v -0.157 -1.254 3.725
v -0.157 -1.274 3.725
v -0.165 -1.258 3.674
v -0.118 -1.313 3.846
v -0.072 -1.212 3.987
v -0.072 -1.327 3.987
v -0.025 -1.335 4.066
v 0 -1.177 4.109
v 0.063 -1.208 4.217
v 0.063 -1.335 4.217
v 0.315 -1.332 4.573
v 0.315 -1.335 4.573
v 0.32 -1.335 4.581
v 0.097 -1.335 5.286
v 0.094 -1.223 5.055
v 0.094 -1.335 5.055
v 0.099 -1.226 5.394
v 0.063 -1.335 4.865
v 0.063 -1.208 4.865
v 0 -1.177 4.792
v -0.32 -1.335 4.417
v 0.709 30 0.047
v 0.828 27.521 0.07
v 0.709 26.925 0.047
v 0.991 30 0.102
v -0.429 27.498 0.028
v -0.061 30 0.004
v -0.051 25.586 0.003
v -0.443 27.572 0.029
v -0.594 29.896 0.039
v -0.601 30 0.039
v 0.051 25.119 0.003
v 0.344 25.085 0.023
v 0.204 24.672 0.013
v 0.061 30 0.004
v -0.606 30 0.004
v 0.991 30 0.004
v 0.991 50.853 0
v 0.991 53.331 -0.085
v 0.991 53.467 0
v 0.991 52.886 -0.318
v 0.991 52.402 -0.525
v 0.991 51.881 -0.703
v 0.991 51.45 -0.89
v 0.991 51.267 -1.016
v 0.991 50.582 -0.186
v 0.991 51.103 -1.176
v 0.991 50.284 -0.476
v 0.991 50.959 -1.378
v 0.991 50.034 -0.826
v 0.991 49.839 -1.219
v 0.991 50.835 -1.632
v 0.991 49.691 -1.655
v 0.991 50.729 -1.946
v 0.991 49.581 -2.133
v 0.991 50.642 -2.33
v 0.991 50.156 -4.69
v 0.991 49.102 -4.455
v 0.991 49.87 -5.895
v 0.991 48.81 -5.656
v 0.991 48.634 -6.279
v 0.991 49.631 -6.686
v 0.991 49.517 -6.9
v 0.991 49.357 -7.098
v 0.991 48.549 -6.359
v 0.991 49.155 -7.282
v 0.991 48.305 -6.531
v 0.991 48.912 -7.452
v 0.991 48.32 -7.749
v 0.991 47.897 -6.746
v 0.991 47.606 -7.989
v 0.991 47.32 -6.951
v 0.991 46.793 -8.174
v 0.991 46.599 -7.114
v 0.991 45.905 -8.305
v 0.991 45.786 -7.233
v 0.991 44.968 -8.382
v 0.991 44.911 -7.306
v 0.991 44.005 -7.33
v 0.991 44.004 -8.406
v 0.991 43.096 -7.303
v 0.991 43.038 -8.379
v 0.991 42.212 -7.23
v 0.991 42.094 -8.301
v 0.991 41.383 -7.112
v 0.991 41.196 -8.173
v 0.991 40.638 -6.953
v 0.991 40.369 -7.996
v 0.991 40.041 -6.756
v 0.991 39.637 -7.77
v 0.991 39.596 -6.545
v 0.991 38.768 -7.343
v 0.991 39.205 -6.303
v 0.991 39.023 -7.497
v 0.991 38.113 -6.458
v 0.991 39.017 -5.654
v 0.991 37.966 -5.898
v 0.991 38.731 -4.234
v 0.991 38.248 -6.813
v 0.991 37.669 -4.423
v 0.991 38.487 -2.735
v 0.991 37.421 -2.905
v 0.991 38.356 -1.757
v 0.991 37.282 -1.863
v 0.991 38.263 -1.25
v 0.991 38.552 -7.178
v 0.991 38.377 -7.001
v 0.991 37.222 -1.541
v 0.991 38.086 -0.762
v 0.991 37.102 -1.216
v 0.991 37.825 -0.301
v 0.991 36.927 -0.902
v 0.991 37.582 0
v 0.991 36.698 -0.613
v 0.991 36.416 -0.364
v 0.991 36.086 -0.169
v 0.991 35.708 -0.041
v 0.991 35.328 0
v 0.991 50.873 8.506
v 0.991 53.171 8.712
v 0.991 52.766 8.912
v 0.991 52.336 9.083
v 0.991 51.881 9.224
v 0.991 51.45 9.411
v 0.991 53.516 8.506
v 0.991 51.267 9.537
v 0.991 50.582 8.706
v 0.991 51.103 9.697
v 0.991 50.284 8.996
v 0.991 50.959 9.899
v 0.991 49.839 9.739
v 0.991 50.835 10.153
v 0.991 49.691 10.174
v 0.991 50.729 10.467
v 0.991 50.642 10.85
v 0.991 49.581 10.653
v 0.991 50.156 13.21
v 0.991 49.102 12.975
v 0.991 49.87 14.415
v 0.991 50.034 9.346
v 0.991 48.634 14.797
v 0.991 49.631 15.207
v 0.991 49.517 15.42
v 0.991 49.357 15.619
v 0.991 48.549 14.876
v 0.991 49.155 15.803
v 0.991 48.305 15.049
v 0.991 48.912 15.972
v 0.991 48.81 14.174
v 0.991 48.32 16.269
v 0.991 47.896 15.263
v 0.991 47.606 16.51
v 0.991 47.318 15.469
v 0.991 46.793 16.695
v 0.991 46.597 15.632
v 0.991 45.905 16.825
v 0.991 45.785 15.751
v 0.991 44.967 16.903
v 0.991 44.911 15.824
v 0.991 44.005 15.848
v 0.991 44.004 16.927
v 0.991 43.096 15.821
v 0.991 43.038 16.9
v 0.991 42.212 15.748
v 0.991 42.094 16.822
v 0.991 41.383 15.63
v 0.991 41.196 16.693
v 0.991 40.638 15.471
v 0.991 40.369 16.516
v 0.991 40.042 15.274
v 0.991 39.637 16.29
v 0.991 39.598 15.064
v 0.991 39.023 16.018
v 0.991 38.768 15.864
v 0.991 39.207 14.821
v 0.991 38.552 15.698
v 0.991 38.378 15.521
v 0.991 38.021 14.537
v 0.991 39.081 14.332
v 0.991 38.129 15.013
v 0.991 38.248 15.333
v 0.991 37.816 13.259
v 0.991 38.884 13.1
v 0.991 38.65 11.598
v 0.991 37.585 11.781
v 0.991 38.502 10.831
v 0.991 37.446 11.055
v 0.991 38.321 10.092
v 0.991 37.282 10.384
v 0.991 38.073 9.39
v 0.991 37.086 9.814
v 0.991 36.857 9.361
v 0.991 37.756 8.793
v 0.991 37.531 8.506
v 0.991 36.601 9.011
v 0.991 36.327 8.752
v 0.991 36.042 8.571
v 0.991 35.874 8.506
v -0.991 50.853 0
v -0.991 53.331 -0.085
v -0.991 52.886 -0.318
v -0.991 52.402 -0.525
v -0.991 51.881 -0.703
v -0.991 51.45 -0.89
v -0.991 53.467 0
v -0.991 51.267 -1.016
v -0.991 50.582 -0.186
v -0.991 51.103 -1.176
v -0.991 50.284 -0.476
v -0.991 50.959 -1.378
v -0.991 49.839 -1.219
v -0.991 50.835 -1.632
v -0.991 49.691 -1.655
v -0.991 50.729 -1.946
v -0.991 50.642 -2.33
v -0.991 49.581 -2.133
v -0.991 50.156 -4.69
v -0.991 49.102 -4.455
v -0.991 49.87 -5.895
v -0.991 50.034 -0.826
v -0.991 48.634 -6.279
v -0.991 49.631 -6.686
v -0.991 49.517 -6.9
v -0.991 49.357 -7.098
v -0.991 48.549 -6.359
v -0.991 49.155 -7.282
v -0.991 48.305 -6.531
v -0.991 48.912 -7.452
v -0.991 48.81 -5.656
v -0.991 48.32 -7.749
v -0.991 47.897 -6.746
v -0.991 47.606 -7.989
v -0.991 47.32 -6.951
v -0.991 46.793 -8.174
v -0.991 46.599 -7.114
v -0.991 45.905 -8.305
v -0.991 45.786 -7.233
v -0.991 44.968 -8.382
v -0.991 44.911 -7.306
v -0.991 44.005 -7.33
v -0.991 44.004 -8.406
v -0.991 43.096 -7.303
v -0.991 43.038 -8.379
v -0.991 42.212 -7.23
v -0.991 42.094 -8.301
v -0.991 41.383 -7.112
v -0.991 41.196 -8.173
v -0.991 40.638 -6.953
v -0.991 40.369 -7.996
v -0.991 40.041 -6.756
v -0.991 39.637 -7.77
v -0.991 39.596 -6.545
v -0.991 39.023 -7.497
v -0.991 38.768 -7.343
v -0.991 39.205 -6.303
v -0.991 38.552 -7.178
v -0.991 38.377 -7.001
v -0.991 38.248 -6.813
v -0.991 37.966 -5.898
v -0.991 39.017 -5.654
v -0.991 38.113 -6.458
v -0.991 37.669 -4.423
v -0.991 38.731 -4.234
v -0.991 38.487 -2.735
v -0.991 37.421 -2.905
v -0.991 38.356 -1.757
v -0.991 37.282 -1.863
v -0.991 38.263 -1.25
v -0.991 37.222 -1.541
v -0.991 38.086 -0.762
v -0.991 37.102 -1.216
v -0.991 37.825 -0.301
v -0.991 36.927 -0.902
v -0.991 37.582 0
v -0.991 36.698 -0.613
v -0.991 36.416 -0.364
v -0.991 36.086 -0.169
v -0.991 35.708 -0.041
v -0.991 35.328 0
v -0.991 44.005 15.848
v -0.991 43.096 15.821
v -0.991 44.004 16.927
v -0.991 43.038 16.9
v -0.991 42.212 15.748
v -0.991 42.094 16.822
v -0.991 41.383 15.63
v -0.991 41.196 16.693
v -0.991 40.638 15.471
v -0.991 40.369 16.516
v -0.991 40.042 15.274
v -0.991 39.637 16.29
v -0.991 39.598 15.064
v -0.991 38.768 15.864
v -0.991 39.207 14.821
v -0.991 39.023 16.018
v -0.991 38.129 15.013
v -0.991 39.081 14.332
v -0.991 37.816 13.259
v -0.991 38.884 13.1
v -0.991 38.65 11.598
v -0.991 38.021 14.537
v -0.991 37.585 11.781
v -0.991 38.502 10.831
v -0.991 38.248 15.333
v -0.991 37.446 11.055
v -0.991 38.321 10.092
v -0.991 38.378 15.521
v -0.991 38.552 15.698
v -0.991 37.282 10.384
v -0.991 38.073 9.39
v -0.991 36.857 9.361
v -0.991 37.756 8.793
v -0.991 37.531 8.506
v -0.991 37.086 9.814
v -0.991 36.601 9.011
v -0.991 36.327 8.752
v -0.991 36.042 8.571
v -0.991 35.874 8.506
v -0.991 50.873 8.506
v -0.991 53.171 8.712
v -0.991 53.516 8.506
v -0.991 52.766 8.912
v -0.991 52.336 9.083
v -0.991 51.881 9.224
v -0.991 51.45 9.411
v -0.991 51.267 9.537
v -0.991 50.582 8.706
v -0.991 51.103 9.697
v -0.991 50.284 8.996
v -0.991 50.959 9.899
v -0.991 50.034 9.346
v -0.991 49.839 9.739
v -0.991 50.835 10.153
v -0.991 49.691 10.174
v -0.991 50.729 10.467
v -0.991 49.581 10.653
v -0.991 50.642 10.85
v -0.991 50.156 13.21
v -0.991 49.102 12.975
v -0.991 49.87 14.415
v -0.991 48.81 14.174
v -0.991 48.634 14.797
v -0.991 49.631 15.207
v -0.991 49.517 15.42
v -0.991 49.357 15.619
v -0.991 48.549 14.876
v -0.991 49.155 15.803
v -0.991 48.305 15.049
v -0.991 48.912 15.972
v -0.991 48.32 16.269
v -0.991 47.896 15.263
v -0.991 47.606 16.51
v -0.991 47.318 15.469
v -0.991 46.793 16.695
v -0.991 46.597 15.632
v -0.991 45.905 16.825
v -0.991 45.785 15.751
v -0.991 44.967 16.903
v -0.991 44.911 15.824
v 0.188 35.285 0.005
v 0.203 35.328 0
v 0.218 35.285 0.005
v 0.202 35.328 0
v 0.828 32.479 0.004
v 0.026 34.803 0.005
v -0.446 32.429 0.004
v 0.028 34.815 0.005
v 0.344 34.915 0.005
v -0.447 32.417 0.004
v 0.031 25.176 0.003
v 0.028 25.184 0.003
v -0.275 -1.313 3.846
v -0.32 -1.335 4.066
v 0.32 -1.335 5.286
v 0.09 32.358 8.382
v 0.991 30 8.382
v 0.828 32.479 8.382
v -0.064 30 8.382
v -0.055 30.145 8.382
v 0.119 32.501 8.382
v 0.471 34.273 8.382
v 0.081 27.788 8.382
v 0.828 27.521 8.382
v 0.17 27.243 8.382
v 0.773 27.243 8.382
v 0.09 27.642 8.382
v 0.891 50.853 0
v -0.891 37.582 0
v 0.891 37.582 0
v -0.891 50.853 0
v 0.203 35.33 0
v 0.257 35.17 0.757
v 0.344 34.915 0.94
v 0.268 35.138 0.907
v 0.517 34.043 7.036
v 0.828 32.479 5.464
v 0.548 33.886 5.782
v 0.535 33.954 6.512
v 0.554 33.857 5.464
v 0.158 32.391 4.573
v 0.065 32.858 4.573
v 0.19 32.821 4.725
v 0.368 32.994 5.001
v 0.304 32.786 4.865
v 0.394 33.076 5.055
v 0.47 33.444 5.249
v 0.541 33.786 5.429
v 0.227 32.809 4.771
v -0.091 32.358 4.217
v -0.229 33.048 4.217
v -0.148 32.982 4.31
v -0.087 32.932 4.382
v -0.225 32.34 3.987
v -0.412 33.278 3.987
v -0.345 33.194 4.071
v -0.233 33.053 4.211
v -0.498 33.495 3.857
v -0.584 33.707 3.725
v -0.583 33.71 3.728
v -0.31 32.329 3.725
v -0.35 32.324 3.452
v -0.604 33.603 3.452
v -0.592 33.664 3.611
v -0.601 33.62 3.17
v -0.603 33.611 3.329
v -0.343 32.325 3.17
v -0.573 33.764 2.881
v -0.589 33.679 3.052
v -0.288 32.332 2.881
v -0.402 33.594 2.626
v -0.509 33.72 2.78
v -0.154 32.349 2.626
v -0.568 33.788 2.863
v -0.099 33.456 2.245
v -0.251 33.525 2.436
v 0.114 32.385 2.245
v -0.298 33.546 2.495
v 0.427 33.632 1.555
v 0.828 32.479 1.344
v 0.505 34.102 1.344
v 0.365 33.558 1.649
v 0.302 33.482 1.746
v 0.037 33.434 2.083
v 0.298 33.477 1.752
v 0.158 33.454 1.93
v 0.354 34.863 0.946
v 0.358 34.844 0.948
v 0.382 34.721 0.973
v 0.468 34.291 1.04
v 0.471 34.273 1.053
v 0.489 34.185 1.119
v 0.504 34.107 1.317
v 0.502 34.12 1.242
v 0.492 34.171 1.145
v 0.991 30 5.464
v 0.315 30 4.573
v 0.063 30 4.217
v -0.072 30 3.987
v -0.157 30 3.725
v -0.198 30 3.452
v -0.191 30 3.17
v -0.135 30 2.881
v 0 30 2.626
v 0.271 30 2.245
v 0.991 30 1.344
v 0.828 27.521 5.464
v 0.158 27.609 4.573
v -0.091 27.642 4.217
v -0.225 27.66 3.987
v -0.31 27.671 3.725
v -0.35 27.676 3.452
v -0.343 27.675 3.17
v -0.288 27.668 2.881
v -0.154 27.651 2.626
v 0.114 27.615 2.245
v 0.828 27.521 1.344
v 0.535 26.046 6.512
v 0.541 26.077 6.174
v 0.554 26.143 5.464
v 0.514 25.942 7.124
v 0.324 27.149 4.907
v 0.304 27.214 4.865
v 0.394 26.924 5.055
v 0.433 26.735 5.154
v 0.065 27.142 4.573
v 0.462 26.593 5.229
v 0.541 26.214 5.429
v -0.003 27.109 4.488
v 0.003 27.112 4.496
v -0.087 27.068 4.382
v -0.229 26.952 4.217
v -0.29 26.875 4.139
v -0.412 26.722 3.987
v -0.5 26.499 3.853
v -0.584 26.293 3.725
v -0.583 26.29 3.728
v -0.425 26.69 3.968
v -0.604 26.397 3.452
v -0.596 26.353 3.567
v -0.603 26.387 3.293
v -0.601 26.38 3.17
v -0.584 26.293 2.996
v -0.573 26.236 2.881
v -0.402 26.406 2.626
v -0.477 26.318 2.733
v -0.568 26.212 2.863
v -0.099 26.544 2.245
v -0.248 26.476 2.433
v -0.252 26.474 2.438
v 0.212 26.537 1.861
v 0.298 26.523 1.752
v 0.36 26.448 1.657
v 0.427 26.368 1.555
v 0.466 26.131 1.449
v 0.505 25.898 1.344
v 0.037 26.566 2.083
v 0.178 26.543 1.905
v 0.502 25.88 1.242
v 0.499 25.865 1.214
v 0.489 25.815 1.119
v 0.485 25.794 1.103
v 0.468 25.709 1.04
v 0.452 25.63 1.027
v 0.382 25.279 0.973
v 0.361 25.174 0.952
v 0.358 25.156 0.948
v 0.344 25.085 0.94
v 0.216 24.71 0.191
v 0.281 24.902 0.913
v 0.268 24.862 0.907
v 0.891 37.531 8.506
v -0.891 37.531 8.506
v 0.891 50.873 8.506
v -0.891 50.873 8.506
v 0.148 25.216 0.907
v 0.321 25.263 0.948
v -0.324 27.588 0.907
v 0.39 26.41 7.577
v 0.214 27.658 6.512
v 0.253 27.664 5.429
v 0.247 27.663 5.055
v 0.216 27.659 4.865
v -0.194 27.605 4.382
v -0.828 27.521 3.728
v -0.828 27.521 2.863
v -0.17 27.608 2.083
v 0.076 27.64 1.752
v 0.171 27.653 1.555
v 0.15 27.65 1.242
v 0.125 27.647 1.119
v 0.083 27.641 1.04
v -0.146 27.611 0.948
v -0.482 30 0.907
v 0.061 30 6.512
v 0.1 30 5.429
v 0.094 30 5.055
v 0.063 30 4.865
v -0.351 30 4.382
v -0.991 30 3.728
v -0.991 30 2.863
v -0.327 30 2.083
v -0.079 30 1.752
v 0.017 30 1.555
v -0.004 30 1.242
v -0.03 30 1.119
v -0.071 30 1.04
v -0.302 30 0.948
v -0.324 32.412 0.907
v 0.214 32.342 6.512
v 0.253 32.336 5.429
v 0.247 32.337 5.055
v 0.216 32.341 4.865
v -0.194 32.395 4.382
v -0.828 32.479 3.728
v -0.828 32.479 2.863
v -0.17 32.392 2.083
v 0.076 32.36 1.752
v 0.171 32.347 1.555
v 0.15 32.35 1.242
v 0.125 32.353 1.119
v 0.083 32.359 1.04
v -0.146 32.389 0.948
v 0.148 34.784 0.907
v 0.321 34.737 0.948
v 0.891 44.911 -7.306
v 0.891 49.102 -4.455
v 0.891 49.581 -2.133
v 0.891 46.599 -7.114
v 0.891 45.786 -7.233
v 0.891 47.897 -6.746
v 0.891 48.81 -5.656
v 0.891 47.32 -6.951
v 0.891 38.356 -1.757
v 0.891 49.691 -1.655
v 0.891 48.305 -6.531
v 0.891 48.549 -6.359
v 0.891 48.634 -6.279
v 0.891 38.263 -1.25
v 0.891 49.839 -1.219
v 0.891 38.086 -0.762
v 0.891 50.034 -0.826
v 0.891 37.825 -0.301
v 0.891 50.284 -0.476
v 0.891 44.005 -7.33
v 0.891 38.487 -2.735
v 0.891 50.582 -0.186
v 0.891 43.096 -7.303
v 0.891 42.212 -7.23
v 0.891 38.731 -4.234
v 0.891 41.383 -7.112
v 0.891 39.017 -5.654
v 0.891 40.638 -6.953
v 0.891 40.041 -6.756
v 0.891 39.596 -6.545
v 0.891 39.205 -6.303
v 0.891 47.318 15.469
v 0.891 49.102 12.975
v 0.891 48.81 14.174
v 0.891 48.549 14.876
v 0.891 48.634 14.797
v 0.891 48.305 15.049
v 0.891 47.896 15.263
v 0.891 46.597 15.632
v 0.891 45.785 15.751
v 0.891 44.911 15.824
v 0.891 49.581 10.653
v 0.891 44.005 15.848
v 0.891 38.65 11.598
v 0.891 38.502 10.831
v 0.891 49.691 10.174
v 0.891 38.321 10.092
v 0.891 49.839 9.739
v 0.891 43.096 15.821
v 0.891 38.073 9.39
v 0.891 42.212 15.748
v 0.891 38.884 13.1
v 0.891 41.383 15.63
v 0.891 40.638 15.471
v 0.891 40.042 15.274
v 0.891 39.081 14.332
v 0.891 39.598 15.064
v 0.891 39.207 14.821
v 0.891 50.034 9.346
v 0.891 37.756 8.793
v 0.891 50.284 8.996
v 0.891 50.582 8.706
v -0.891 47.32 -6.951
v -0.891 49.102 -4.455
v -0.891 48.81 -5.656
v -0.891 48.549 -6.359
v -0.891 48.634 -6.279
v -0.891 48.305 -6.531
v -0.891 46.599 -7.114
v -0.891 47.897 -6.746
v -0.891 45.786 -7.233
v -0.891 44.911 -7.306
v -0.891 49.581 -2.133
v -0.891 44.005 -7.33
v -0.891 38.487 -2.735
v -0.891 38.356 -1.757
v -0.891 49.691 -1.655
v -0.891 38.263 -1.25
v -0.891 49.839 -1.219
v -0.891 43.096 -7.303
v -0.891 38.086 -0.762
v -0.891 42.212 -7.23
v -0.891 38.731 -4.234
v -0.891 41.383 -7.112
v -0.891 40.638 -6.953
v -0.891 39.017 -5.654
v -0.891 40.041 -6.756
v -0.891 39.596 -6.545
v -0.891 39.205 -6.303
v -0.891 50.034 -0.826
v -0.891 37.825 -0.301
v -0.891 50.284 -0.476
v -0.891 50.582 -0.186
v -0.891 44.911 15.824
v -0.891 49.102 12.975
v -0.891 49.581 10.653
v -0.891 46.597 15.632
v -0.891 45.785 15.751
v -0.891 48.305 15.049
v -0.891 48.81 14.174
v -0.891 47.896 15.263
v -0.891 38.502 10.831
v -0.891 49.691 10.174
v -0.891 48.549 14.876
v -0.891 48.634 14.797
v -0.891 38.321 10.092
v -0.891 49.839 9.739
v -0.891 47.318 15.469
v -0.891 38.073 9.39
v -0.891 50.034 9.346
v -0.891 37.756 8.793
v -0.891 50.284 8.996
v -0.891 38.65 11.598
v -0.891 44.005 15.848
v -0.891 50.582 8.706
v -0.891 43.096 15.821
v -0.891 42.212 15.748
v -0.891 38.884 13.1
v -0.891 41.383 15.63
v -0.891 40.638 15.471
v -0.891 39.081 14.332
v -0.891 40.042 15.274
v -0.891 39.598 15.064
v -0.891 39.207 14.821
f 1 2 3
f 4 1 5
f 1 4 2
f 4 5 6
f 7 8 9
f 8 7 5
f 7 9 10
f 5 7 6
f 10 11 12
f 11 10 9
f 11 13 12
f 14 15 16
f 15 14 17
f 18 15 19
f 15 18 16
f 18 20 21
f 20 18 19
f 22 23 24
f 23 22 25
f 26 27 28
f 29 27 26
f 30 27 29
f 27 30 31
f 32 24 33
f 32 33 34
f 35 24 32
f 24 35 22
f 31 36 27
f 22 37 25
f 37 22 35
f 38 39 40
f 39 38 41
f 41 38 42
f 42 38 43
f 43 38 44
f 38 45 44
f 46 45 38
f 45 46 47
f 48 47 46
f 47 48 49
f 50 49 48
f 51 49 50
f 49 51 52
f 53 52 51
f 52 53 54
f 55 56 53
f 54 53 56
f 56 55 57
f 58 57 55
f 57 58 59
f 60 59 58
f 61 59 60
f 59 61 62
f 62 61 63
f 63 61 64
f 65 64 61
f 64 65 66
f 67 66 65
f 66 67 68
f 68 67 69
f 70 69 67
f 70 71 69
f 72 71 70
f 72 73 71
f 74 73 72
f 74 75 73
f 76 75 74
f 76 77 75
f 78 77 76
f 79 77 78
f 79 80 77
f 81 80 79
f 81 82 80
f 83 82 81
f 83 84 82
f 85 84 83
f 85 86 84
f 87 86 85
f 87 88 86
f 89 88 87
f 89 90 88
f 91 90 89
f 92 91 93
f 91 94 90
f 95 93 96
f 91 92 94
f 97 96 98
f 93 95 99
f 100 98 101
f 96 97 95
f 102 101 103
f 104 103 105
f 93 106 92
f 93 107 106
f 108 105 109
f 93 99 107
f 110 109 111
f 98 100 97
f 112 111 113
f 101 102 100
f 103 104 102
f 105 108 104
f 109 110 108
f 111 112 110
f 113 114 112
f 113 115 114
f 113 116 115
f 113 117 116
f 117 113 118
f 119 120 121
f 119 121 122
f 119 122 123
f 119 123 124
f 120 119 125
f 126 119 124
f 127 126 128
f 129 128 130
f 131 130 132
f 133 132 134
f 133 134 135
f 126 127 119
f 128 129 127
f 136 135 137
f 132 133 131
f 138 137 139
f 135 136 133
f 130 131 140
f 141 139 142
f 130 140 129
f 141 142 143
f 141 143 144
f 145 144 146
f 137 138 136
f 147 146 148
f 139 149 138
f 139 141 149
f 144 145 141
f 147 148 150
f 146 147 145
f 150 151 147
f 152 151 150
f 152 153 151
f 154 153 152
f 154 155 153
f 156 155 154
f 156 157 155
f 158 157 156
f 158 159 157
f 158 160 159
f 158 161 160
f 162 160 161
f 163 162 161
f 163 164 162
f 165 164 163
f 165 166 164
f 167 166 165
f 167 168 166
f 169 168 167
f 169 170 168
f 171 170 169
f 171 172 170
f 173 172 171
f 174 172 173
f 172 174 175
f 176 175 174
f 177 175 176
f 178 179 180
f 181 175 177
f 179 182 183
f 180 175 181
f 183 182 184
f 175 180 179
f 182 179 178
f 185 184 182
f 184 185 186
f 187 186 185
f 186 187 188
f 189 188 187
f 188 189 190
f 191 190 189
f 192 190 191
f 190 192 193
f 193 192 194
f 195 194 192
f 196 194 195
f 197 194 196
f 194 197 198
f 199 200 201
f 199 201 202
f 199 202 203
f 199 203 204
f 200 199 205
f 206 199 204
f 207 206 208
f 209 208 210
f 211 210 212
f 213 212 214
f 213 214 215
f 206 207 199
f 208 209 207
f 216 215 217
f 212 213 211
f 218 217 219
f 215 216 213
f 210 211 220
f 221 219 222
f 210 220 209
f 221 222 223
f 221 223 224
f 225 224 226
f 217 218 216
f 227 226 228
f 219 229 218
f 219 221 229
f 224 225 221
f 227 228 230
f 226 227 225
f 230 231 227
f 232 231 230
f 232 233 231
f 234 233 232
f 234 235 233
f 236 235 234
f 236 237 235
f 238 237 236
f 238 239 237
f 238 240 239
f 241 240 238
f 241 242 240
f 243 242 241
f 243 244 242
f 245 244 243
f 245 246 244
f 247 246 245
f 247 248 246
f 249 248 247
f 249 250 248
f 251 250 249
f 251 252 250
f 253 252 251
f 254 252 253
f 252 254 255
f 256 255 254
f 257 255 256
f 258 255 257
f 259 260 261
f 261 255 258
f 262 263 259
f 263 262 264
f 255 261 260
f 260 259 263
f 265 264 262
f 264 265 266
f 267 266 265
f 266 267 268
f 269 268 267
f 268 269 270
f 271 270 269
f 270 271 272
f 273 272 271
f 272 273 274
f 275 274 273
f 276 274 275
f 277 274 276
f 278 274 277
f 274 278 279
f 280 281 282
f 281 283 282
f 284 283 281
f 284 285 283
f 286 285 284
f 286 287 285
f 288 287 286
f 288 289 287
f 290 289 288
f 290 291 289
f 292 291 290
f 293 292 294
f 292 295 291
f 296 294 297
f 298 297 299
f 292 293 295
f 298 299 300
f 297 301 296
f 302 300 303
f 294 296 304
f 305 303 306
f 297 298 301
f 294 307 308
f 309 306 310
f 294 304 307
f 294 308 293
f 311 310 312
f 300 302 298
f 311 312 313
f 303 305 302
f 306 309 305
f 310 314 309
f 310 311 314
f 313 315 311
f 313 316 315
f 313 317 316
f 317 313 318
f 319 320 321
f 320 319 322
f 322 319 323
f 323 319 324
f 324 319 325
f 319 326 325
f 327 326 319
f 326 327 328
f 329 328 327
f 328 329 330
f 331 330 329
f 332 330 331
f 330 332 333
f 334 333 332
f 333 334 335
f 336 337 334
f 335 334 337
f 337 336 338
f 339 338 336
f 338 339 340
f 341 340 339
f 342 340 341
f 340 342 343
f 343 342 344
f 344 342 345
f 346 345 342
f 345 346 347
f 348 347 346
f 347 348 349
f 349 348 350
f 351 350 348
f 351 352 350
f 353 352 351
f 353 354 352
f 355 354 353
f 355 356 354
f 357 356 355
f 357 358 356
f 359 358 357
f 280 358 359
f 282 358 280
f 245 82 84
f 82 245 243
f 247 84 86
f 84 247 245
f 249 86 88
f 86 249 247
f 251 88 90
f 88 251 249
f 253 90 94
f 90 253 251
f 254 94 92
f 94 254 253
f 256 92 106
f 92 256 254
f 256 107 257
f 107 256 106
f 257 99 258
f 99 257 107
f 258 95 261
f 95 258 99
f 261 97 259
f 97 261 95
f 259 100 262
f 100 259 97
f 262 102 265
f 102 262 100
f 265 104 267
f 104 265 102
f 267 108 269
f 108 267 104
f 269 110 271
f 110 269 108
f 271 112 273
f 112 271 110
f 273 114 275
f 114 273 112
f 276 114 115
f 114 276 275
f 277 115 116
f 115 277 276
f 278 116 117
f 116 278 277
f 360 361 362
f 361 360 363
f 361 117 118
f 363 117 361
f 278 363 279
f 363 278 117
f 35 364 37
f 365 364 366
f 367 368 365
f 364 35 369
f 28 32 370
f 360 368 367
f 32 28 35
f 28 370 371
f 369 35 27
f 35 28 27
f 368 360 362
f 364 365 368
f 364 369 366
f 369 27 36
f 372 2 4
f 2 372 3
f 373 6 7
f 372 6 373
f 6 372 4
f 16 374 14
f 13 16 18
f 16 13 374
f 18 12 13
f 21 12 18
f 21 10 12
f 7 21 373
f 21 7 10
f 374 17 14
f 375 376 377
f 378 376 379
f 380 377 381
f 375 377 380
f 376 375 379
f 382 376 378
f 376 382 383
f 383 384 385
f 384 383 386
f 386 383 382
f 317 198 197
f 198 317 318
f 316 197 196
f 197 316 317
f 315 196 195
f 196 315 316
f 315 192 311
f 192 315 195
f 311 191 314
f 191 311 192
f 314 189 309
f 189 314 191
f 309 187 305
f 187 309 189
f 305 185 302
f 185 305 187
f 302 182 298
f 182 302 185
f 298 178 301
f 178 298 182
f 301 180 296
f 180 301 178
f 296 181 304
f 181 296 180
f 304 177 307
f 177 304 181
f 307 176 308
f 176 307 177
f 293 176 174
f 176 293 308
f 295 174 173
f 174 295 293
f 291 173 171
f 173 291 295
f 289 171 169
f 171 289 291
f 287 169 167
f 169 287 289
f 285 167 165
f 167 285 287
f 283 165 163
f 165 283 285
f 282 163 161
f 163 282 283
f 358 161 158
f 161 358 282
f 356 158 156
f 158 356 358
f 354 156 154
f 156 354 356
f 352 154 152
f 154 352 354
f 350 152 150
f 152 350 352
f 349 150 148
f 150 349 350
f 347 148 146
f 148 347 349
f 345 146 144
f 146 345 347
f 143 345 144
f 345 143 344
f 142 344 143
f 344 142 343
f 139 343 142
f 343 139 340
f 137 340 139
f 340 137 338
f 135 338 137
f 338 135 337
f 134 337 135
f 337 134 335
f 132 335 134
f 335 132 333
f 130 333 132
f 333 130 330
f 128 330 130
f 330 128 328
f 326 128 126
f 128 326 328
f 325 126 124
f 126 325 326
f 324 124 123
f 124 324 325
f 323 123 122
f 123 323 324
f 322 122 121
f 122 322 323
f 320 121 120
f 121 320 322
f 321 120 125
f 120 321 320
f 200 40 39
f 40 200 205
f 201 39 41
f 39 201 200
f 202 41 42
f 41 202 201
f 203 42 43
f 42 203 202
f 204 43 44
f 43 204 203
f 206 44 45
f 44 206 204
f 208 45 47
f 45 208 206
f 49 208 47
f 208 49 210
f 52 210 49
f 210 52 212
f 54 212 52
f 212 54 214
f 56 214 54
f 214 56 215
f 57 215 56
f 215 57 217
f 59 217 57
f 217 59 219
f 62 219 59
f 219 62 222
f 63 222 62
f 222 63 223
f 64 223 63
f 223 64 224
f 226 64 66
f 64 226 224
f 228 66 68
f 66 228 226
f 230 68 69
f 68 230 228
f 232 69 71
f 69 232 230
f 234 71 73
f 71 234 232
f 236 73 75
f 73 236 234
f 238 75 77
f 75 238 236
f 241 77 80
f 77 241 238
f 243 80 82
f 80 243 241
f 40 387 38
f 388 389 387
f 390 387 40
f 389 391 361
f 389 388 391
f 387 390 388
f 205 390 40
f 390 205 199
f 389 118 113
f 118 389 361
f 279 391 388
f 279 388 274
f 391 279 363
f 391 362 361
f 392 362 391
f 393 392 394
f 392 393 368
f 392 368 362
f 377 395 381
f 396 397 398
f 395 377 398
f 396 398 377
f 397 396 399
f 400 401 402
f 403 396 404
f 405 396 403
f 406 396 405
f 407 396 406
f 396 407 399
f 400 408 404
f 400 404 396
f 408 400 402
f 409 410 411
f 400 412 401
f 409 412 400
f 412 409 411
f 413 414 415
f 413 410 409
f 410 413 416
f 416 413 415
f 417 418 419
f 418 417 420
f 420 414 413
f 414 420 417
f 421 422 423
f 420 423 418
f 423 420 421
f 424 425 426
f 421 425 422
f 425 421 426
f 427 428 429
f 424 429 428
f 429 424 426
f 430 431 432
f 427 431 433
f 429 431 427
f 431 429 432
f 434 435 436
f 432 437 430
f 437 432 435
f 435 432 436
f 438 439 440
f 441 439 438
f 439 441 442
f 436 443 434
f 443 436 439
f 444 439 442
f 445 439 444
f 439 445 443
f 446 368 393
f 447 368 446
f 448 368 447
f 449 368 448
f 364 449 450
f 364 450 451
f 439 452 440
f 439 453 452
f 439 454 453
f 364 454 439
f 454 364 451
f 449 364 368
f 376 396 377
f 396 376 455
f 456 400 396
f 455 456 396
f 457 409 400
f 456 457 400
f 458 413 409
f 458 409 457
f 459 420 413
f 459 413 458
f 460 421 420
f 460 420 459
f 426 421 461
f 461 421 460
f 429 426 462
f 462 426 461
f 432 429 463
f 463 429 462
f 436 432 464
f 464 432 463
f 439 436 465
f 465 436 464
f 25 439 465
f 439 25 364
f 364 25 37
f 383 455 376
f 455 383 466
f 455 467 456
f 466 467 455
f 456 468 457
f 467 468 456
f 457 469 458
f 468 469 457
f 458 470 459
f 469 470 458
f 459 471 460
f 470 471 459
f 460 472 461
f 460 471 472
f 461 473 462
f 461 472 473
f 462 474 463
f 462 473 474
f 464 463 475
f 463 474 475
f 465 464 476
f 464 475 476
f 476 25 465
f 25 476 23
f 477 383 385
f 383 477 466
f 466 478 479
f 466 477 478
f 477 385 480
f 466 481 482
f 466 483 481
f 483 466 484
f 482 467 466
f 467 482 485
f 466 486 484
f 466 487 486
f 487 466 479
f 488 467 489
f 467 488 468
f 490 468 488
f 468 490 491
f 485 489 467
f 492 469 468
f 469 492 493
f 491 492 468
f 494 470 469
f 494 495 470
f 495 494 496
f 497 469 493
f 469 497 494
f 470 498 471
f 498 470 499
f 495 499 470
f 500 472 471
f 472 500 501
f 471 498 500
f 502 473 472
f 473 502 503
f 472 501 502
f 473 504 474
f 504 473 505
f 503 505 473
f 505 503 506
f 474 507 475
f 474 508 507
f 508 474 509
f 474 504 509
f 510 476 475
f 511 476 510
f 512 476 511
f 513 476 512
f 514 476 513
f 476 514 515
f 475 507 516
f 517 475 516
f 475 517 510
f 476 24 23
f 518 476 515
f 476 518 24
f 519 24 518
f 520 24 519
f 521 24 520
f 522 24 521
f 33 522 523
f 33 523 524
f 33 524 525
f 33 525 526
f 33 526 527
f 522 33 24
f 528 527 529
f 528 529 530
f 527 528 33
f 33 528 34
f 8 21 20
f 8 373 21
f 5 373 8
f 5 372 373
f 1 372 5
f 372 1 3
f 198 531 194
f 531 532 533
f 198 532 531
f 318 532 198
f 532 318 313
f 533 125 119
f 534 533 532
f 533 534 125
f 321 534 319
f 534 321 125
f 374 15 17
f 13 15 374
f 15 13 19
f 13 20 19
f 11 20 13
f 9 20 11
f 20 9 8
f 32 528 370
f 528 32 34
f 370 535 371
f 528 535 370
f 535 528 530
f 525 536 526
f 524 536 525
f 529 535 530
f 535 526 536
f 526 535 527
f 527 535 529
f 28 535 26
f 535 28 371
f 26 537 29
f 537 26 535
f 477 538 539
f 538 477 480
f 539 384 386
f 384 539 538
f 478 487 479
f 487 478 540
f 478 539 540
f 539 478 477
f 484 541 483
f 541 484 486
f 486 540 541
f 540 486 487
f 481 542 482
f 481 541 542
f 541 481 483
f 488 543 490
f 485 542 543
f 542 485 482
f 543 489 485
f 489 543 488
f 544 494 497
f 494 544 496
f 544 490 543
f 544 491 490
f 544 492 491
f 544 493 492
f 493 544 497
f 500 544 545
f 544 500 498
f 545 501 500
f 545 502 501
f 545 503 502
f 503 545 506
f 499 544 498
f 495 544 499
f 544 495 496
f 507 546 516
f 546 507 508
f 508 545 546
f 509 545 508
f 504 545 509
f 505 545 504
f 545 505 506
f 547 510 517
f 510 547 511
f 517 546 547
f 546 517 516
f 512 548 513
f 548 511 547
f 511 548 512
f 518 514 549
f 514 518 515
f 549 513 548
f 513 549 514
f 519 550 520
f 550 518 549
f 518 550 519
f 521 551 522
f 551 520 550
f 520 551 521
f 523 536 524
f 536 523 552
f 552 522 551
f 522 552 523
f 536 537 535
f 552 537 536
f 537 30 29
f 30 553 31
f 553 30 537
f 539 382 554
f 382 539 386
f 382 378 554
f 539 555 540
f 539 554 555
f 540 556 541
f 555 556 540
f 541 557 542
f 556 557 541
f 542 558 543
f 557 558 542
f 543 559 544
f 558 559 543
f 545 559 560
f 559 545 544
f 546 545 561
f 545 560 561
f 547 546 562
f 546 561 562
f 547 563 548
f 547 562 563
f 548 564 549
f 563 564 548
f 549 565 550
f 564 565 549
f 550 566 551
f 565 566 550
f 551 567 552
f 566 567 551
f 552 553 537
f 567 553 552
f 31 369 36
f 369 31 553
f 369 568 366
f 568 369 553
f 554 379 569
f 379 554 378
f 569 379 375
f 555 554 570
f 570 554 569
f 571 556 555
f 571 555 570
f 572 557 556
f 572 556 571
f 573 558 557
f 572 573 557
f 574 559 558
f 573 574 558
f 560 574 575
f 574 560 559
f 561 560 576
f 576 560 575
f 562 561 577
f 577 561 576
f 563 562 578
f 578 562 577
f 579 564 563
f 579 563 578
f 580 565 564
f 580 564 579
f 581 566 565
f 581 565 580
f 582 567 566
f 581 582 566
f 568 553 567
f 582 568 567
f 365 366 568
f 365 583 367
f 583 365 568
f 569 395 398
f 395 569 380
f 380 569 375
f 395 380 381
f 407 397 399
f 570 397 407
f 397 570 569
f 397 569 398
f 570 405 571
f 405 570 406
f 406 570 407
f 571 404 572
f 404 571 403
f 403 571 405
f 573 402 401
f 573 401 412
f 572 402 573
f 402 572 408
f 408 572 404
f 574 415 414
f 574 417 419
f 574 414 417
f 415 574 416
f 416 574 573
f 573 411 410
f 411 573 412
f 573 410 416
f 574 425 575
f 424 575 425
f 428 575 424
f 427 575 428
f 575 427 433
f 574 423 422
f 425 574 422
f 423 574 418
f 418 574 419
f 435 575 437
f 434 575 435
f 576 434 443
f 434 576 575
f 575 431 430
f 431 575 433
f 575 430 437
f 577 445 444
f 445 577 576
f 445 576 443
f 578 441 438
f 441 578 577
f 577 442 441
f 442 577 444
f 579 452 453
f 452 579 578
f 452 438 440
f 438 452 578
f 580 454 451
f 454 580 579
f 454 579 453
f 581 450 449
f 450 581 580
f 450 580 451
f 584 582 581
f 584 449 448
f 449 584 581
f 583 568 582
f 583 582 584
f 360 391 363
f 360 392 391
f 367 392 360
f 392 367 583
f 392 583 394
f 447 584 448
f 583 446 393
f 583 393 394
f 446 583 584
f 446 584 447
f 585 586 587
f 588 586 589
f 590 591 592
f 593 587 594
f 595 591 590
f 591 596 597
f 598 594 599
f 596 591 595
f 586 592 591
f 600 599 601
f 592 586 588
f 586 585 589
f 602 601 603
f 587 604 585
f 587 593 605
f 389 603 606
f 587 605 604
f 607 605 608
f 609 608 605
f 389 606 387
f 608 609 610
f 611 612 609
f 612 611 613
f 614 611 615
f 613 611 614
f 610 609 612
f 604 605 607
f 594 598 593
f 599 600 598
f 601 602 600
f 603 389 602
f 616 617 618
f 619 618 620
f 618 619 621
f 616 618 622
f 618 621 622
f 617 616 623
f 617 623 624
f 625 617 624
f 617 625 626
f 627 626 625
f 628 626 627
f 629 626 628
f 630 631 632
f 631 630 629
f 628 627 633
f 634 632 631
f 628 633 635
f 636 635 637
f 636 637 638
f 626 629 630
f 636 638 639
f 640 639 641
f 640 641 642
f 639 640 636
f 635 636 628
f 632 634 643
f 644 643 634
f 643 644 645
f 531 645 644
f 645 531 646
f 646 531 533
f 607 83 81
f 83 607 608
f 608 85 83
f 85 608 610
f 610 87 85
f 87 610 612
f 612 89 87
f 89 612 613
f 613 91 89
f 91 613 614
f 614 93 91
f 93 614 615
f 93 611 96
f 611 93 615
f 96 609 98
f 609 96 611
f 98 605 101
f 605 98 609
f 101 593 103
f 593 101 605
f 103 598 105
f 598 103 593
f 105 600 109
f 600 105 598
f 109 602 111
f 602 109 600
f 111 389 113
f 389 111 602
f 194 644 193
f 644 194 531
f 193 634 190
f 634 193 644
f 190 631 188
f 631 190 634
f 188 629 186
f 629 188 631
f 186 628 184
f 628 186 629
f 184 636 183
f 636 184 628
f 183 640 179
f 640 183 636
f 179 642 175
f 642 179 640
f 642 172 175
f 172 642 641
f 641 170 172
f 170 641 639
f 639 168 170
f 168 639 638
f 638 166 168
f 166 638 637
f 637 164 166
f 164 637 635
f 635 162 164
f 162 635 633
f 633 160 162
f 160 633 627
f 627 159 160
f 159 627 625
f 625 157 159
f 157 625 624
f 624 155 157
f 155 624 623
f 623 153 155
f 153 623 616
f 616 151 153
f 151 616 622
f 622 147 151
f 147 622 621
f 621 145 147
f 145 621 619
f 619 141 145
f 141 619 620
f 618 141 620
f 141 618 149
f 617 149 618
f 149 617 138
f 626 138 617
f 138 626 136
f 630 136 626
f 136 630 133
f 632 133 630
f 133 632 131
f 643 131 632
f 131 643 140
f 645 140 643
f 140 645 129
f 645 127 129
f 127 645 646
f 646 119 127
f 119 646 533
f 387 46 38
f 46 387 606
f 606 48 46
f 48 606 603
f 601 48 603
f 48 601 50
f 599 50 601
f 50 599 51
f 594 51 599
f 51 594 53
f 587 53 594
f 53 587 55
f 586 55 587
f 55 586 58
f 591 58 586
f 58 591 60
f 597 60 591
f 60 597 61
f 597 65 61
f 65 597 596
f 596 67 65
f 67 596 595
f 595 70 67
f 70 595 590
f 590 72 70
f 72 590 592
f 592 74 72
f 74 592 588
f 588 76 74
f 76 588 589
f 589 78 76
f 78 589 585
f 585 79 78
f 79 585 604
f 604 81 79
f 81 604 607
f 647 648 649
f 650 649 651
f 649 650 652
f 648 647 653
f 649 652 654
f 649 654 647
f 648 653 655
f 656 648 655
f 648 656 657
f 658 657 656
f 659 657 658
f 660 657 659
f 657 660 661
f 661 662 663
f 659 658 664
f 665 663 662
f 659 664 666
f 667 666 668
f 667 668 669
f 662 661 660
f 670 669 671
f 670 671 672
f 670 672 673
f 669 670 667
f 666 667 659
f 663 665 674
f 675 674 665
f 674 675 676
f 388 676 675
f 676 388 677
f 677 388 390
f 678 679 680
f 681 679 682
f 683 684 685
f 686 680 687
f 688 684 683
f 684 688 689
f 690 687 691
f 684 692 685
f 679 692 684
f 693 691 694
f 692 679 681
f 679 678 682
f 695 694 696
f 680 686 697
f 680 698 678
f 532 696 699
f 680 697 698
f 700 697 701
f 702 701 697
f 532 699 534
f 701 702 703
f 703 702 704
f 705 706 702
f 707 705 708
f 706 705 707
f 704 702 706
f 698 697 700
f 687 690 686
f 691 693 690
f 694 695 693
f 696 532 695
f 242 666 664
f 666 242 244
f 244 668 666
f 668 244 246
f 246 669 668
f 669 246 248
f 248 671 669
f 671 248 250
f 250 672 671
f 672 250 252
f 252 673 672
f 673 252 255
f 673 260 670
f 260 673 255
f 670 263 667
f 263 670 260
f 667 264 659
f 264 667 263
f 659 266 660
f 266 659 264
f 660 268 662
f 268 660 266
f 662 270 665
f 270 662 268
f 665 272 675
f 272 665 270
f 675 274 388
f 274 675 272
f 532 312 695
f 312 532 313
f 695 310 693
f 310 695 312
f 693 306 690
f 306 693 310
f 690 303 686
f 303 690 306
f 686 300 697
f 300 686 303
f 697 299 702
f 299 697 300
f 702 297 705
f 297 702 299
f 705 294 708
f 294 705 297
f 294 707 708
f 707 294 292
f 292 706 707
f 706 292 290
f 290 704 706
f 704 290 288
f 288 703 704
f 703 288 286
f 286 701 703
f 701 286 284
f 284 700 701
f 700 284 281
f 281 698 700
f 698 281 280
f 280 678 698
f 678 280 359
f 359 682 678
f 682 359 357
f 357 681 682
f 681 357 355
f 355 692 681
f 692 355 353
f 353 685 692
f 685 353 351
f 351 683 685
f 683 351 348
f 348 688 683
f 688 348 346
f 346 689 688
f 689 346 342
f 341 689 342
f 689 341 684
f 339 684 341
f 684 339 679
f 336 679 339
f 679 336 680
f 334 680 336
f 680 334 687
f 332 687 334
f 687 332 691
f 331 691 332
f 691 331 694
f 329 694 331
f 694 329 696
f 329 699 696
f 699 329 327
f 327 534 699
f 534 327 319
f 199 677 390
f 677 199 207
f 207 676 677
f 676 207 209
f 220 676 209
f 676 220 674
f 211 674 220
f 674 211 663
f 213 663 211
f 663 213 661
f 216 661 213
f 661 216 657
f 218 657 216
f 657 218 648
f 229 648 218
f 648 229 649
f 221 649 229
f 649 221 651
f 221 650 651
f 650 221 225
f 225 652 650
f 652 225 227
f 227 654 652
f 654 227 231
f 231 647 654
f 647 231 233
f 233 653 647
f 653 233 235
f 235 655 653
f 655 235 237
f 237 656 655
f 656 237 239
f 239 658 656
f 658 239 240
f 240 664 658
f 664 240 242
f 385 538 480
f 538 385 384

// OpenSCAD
// file: keygen.scad
$inf=1000;
$eps=.01;

function key_move(points, offset) = [
    for(p=points) [p[0] + offset[0],
                   p[1] + offset[1]]
];

module key_outline(outline_points, thickness, outline_paths=undef) {
    rotate(-90, [0, 1, 0]) rotate(-90, [0, 0, 1]) // Rotate into the correct plane
        linear_extrude(height=thickness, center=true) // Extrude the key outline
            polygon(points=outline_points, paths=outline_paths); // Draw the outline
}

module key_blade(warding, plug_diameter=0) {
    // Draw the blade to infinity in Y
    // optionally intersected with the plug cylinder
    // to round the bottom
    intersection() {
        rotate(90, [1, 0, 0])
            linear_extrude(height=2*$inf, center=true)
                polygon(warding);

        // Draw the plug, if a plug diameter is specified
        if(plug_diameter > 0) {
            // Draw infinite cylinder in -Y
            translate([0, 0, 0.5*plug_diameter]) rotate(90, [1, 0, 0])
                cylinder(r=0.5*plug_diameter, h=$inf, center=true, $fn=$fn ? 4*$fn : 48);
        }
    }
}

module key_x_line(length) {
    // Hack to draw a line in X
    // since OpenSCAD does not support line primitives
    // Take a 2D square and rotate it
    // When it is orthogonal to the XY plane,
    // it projects down to a line
    rotate(90, [1, 0, 0])
    square([length, length], center=true);
}

module key_warding_cutter(warding, blade_height, cutter_radius, left) {
    neg = left ? -1 : 1;
    translate([neg * -cutter_radius, 0, 0])
        rotate_extrude($fn=$fn ? 4*$fn : 48)
            translate([neg * cutter_radius, 0])
                difference() {
                    translate([0, 0.5*blade_height])
                        square([2 * cutter_radius, blade_height], center=true);
                    minkowski() {
                        translate([neg * 1.5 * cutter_radius, 0])
                            key_x_line(3 * cutter_radius);
                        polygon(warding);
                    }
                    polygon(warding);
                }
}

module key_engrave(engrave_points, engrave_depth, left, thickness, engrave_paths=undef) {
    translate([(left ? -1 : 1) * 0.5*thickness, 0, 0]) rotate(-90, [0, 1, 0]) rotate(-90, [0, 0, 1]) // Translate and rotate into the correct soot
        linear_extrude(height=2*engrave_depth, center=true) // Extrude the key outline
            polygon(points=engrave_points, paths=engrave_paths); // Draw the outline
}

module key_blank(outline_points,
                warding,
                outline_paths=undef,
                engrave_right_points=[],
                engrave_right_paths=undef,
                engrave_left_points=[],
                engrave_left_paths=undef,
                bow_thickness=0,
                engrave_depth=.1,
                plug_diameter=0,
                offset=[0, 0],
                cutter_radius=18,
                milling_offset=0) {

    // Find the bounding box of the warding
    warding_min = [min([for(e=warding) e[0]]), min([for(e=warding) e[1]])];
    warding_max = [max([for(e=warding) e[0]]), max([for(e=warding) e[1]])];

    // Apply the given offset to the outline,
    // holes, and engrave
    outline_adj = key_move(outline_points, offset);
    engrave_left_adj = key_move(engrave_left_points, offset);
    engrave_right_adj = key_move(engrave_right_points, offset);

    // Move the warding profile
    // so that it is centered in X
    // and non-negative in Y
    warding_offset = [-0.5 * (warding_min[0] + warding_max[0]),
                      -warding_min[1]];
    warding_adj = key_move(warding, warding_offset);

    // Infer various key properties
    thickness = (bow_thickness == 0) ? abs(warding_max[0] - warding_min[0]) : bow_thickness;
    blade_height = abs(warding_max[1] - warding_min[1]);

    // Cut out the warding milling artifacts
    // from the bow
    difference() {
        // Create the bulk of the keyblank
        // by intersecting the outline
        // with the warding profile
        // and the plug
        intersection() {
            // Draw the key outline and holes
            key_outline(outline_adj, thickness, outline_paths);
            
            // Draw the blade, and a giant box where the bow is
            // so that we don't wipe out the bow
            // when the intersection happens
            union() {
                // Fill +Y half-space
                translate([0, $inf/2+milling_offset, 0])
                    cube([$inf, $inf, $inf], center=true);

                key_blade(warding_adj, plug_diameter);
            }
        }
        // Draw the milling wheels that cut the warding
        if(cutter_radius != 0) {
            translate([0, milling_offset, 0])
                union() {
                    key_warding_cutter(warding_adj, blade_height, cutter_radius, false);
                    key_warding_cutter(warding_adj, blade_height, cutter_radius, true);
                }
        }

        // Draw the engraveing
        key_engrave(engrave_right_adj, engrave_depth, false, thickness, engrave_right_paths);
        key_engrave(engrave_left_adj, engrave_depth, true, thickness, engrave_left_paths);
    }
}

function key_code_to_heights(code, depth_table) = [for(i=[0:len(code)-1]) depth_table[search(code[i], "0123456789")[0]]];

module key_bitting_cutter(flat, angle, tool_height) {
    polygon([[-0.5 * flat, 0],
            [0.5 * flat, 0],
            [0.5 * flat + tan(0.5 * angle) * tool_height, tool_height],
            [0.5 * flat - tan(0.5 * angle) * tool_height, tool_height]]);
}

module key_bitting(heights,
                   locations,
                   flat,
                   angle=100,
                   cutter_width=5,
                   cutter_height=5) {
    // Rotate the cutting tool to the proper orientation
    rotate(-90, [0, 0, 1]) rotate(90, [1, 0, 0])
        // Union together a handful of trapezoids
        // that comprise the cuts
        union() {
            for(i=[0:len(heights)-1]) {
                // Move to the proper location and height
                translate([locations[i], heights[i]])
                    linear_extrude(height=cutter_width, center=true)
                        key_bitting_cutter(flat, angle, cutter_height);
            }
        }
}
// main file
use <keygen.scad>
include <fm.gen.scad>

bitting_code = "1526985";

// The FM keyblank can be used in many key systems
// This is the depth table for Best A2 system

cut_locations = [for(i=[.080, .230, .380, .530, .680, .830, .980]) -i*25.4];

depth_table = [for(i=[0.318:-0.0125:0.205]) i*25.4];

heights = key_code_to_heights(bitting_code, depth_table);

difference() {
    key_blank(outline_points,
              warding_points,
              outline_paths=outline_paths,
              engrave_right_points=engrave_points,
              engrave_right_paths=engrave_paths,
              engrave_left_points=engrave_points,
              engrave_left_paths=engrave_paths,
              offset=[-outline_points[103][0], -outline_points[96][1]],
              milling_offset=30,
              plug_diameter=10.8712);
    key_bitting(heights, cut_locations, .7874);
}
